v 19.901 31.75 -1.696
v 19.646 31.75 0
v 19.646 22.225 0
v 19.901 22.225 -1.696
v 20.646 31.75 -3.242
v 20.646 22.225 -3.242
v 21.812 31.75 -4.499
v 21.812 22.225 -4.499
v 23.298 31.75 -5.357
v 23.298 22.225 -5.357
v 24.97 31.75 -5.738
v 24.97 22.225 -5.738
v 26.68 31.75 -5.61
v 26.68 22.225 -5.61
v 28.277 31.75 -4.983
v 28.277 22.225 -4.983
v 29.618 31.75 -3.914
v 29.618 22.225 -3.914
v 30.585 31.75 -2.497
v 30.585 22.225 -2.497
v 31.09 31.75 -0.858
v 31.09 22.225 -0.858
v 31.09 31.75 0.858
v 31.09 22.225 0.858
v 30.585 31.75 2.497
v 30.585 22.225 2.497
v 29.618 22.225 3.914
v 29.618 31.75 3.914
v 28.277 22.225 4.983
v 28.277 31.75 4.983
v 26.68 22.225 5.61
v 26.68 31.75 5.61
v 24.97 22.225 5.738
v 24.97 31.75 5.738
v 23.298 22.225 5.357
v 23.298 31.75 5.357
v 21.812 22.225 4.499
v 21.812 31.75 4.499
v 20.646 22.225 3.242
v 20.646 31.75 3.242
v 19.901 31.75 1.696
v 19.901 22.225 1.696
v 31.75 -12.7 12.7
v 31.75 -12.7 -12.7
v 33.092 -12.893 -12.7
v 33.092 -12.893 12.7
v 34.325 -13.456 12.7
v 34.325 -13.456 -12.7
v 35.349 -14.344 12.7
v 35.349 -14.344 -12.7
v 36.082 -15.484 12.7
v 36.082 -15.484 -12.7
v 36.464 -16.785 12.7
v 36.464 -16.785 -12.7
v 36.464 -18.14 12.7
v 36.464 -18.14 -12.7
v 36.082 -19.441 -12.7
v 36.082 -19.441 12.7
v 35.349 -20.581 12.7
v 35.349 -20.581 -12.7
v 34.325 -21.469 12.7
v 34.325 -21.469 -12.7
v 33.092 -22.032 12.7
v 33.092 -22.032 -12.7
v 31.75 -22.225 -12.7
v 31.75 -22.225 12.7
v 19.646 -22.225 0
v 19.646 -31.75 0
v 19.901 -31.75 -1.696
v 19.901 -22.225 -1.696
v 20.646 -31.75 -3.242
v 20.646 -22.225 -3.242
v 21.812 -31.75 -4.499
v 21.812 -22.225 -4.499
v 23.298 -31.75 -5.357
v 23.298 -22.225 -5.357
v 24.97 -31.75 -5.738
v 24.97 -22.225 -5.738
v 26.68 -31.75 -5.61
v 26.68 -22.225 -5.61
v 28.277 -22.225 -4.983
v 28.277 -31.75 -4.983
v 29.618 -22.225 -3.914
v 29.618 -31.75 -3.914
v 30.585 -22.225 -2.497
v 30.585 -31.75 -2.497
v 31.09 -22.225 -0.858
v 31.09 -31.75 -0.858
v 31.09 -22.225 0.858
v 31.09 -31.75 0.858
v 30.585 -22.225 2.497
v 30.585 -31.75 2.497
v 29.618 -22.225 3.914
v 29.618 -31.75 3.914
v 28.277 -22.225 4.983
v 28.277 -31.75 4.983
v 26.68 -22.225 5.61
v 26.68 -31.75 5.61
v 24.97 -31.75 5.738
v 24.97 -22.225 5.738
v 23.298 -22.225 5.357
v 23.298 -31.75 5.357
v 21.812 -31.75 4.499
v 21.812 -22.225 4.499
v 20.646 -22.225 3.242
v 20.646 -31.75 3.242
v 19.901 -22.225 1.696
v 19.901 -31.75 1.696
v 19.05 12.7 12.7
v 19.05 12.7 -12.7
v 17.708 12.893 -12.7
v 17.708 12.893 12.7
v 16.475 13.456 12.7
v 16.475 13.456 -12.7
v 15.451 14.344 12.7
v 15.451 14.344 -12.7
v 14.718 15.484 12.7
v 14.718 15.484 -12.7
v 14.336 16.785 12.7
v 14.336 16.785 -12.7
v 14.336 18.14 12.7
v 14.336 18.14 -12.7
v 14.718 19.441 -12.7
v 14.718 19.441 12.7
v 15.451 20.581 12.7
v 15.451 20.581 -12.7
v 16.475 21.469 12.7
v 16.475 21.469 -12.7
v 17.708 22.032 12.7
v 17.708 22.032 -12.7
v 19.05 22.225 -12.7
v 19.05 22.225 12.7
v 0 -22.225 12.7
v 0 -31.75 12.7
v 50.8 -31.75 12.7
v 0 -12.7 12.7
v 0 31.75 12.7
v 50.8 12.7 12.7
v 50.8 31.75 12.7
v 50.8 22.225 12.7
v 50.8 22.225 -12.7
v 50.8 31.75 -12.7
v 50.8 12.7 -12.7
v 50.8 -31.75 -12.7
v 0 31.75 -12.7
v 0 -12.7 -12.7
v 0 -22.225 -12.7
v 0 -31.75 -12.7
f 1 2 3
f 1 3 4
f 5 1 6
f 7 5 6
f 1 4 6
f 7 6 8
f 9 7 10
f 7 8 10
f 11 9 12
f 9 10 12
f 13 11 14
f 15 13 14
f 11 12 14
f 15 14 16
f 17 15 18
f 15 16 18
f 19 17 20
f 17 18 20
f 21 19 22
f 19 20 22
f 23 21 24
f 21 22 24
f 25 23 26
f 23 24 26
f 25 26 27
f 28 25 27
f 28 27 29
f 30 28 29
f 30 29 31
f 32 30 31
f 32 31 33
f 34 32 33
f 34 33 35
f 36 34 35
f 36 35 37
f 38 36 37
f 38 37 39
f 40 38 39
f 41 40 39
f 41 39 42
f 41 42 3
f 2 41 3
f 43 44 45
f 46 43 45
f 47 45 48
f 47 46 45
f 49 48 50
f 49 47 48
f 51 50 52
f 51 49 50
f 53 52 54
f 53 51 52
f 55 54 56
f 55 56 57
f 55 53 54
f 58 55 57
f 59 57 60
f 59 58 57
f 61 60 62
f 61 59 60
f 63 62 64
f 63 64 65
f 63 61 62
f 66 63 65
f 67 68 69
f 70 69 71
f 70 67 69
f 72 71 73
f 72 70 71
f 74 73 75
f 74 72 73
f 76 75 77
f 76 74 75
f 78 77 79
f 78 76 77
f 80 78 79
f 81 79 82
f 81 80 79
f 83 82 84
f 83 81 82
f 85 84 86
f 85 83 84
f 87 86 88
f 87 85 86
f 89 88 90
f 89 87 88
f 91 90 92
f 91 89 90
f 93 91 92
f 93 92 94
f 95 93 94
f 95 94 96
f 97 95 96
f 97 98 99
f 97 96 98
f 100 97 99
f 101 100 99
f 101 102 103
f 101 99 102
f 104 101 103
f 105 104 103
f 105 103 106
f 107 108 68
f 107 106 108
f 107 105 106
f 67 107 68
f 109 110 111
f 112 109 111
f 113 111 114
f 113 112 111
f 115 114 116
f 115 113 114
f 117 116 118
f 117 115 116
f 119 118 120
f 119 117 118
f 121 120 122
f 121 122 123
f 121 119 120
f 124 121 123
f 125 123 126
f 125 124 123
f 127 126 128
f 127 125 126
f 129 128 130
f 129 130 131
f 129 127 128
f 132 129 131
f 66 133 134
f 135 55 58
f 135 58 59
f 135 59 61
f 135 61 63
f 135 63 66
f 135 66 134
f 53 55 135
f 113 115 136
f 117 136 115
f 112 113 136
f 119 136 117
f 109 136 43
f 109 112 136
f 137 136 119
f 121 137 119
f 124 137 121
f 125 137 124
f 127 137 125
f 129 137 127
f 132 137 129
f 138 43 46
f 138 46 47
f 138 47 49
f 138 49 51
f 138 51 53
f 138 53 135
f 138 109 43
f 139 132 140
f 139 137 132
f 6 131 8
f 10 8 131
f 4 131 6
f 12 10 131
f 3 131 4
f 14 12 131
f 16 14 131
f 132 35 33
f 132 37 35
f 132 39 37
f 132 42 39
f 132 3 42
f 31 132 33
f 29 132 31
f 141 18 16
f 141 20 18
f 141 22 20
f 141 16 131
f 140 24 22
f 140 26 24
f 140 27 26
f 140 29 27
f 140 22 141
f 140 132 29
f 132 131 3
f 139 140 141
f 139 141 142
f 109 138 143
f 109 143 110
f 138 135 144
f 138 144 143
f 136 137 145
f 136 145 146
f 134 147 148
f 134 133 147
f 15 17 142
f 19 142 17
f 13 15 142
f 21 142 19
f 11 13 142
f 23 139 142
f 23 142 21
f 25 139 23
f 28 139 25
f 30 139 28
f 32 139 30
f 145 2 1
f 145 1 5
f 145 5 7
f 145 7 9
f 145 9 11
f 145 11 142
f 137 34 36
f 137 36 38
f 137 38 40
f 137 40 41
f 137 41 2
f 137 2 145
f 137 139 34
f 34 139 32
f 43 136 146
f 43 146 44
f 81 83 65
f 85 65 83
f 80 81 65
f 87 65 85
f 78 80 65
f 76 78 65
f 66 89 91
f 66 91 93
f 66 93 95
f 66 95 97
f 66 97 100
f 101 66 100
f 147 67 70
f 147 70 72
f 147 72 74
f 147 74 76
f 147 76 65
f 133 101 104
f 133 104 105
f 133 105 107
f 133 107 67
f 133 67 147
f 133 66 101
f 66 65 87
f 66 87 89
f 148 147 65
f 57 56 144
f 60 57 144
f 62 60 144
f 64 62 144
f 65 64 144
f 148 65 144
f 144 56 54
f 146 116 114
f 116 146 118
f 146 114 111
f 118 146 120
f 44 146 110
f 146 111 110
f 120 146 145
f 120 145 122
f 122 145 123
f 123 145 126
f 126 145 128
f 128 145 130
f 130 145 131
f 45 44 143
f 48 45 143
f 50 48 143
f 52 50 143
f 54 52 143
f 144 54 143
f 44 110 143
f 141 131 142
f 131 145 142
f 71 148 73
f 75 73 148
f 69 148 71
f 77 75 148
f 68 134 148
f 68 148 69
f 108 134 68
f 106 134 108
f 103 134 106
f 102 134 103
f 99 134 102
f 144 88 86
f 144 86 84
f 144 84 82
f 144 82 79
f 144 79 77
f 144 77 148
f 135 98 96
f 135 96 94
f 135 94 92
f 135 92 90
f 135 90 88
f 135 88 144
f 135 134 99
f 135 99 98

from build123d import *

# Parameters (mm, degrees)
BOSS_EXTRUDE1_DEPTH         = 12.7
F_1_2_20_TAPPED_HOLE1_D     = 11.50874
F_1_2_20_TAPPED_HOLE1_DEPTH = 9.525


with BuildPart() as part:
    # Sketch2 → Boss-Extrude1 (new, symmetric)
    with BuildSketch(Plane.XY):
        with BuildLine():
            Line((0, -31.75), (50.8, -31.75))
            Line((50.8, -31.75), (50.8, 12.7))
            Line((50.8, 12.7), (19.05, 12.7))
            ThreePointArc((19.05, 12.7), (14.2875, 17.4625), (19.05, 22.225))
            Line((19.05, 22.225), (50.8, 22.225))
            Line((50.8, 22.225), (50.8, 31.75))
            Line((50.8, 31.75), (0, 31.75))
            Line((0, 31.75), (0, -12.7))
            Line((0, -12.7), (31.75, -12.7))
            ThreePointArc((31.75, -12.7), (36.5125, -17.4625), (31.75, -22.225))
            Line((31.75, -22.225), (0, -22.225))
            Line((0, -22.225), (0, -31.75))
        make_face()
    extrude(amount=BOSS_EXTRUDE1_DEPTH, both=True)

    # 1/2-20 Tapped Hole1
    with Locations(Plane(origin=(0, 31.75, 0), x_dir=(1, 0, 0), z_dir=(0, 1, 0))):
        with Locations((25.4, 0)):
            f_1_2_20_tapped_hole1 = Hole(F_1_2_20_TAPPED_HOLE1_D / 2, depth=F_1_2_20_TAPPED_HOLE1_DEPTH)

    # Mirror1: 1/2-20 Tapped Hole1 across plane
    add(f_1_2_20_tapped_hole1.mirror(Plane.ZX), mode=Mode.SUBTRACT)


solid = part.part
